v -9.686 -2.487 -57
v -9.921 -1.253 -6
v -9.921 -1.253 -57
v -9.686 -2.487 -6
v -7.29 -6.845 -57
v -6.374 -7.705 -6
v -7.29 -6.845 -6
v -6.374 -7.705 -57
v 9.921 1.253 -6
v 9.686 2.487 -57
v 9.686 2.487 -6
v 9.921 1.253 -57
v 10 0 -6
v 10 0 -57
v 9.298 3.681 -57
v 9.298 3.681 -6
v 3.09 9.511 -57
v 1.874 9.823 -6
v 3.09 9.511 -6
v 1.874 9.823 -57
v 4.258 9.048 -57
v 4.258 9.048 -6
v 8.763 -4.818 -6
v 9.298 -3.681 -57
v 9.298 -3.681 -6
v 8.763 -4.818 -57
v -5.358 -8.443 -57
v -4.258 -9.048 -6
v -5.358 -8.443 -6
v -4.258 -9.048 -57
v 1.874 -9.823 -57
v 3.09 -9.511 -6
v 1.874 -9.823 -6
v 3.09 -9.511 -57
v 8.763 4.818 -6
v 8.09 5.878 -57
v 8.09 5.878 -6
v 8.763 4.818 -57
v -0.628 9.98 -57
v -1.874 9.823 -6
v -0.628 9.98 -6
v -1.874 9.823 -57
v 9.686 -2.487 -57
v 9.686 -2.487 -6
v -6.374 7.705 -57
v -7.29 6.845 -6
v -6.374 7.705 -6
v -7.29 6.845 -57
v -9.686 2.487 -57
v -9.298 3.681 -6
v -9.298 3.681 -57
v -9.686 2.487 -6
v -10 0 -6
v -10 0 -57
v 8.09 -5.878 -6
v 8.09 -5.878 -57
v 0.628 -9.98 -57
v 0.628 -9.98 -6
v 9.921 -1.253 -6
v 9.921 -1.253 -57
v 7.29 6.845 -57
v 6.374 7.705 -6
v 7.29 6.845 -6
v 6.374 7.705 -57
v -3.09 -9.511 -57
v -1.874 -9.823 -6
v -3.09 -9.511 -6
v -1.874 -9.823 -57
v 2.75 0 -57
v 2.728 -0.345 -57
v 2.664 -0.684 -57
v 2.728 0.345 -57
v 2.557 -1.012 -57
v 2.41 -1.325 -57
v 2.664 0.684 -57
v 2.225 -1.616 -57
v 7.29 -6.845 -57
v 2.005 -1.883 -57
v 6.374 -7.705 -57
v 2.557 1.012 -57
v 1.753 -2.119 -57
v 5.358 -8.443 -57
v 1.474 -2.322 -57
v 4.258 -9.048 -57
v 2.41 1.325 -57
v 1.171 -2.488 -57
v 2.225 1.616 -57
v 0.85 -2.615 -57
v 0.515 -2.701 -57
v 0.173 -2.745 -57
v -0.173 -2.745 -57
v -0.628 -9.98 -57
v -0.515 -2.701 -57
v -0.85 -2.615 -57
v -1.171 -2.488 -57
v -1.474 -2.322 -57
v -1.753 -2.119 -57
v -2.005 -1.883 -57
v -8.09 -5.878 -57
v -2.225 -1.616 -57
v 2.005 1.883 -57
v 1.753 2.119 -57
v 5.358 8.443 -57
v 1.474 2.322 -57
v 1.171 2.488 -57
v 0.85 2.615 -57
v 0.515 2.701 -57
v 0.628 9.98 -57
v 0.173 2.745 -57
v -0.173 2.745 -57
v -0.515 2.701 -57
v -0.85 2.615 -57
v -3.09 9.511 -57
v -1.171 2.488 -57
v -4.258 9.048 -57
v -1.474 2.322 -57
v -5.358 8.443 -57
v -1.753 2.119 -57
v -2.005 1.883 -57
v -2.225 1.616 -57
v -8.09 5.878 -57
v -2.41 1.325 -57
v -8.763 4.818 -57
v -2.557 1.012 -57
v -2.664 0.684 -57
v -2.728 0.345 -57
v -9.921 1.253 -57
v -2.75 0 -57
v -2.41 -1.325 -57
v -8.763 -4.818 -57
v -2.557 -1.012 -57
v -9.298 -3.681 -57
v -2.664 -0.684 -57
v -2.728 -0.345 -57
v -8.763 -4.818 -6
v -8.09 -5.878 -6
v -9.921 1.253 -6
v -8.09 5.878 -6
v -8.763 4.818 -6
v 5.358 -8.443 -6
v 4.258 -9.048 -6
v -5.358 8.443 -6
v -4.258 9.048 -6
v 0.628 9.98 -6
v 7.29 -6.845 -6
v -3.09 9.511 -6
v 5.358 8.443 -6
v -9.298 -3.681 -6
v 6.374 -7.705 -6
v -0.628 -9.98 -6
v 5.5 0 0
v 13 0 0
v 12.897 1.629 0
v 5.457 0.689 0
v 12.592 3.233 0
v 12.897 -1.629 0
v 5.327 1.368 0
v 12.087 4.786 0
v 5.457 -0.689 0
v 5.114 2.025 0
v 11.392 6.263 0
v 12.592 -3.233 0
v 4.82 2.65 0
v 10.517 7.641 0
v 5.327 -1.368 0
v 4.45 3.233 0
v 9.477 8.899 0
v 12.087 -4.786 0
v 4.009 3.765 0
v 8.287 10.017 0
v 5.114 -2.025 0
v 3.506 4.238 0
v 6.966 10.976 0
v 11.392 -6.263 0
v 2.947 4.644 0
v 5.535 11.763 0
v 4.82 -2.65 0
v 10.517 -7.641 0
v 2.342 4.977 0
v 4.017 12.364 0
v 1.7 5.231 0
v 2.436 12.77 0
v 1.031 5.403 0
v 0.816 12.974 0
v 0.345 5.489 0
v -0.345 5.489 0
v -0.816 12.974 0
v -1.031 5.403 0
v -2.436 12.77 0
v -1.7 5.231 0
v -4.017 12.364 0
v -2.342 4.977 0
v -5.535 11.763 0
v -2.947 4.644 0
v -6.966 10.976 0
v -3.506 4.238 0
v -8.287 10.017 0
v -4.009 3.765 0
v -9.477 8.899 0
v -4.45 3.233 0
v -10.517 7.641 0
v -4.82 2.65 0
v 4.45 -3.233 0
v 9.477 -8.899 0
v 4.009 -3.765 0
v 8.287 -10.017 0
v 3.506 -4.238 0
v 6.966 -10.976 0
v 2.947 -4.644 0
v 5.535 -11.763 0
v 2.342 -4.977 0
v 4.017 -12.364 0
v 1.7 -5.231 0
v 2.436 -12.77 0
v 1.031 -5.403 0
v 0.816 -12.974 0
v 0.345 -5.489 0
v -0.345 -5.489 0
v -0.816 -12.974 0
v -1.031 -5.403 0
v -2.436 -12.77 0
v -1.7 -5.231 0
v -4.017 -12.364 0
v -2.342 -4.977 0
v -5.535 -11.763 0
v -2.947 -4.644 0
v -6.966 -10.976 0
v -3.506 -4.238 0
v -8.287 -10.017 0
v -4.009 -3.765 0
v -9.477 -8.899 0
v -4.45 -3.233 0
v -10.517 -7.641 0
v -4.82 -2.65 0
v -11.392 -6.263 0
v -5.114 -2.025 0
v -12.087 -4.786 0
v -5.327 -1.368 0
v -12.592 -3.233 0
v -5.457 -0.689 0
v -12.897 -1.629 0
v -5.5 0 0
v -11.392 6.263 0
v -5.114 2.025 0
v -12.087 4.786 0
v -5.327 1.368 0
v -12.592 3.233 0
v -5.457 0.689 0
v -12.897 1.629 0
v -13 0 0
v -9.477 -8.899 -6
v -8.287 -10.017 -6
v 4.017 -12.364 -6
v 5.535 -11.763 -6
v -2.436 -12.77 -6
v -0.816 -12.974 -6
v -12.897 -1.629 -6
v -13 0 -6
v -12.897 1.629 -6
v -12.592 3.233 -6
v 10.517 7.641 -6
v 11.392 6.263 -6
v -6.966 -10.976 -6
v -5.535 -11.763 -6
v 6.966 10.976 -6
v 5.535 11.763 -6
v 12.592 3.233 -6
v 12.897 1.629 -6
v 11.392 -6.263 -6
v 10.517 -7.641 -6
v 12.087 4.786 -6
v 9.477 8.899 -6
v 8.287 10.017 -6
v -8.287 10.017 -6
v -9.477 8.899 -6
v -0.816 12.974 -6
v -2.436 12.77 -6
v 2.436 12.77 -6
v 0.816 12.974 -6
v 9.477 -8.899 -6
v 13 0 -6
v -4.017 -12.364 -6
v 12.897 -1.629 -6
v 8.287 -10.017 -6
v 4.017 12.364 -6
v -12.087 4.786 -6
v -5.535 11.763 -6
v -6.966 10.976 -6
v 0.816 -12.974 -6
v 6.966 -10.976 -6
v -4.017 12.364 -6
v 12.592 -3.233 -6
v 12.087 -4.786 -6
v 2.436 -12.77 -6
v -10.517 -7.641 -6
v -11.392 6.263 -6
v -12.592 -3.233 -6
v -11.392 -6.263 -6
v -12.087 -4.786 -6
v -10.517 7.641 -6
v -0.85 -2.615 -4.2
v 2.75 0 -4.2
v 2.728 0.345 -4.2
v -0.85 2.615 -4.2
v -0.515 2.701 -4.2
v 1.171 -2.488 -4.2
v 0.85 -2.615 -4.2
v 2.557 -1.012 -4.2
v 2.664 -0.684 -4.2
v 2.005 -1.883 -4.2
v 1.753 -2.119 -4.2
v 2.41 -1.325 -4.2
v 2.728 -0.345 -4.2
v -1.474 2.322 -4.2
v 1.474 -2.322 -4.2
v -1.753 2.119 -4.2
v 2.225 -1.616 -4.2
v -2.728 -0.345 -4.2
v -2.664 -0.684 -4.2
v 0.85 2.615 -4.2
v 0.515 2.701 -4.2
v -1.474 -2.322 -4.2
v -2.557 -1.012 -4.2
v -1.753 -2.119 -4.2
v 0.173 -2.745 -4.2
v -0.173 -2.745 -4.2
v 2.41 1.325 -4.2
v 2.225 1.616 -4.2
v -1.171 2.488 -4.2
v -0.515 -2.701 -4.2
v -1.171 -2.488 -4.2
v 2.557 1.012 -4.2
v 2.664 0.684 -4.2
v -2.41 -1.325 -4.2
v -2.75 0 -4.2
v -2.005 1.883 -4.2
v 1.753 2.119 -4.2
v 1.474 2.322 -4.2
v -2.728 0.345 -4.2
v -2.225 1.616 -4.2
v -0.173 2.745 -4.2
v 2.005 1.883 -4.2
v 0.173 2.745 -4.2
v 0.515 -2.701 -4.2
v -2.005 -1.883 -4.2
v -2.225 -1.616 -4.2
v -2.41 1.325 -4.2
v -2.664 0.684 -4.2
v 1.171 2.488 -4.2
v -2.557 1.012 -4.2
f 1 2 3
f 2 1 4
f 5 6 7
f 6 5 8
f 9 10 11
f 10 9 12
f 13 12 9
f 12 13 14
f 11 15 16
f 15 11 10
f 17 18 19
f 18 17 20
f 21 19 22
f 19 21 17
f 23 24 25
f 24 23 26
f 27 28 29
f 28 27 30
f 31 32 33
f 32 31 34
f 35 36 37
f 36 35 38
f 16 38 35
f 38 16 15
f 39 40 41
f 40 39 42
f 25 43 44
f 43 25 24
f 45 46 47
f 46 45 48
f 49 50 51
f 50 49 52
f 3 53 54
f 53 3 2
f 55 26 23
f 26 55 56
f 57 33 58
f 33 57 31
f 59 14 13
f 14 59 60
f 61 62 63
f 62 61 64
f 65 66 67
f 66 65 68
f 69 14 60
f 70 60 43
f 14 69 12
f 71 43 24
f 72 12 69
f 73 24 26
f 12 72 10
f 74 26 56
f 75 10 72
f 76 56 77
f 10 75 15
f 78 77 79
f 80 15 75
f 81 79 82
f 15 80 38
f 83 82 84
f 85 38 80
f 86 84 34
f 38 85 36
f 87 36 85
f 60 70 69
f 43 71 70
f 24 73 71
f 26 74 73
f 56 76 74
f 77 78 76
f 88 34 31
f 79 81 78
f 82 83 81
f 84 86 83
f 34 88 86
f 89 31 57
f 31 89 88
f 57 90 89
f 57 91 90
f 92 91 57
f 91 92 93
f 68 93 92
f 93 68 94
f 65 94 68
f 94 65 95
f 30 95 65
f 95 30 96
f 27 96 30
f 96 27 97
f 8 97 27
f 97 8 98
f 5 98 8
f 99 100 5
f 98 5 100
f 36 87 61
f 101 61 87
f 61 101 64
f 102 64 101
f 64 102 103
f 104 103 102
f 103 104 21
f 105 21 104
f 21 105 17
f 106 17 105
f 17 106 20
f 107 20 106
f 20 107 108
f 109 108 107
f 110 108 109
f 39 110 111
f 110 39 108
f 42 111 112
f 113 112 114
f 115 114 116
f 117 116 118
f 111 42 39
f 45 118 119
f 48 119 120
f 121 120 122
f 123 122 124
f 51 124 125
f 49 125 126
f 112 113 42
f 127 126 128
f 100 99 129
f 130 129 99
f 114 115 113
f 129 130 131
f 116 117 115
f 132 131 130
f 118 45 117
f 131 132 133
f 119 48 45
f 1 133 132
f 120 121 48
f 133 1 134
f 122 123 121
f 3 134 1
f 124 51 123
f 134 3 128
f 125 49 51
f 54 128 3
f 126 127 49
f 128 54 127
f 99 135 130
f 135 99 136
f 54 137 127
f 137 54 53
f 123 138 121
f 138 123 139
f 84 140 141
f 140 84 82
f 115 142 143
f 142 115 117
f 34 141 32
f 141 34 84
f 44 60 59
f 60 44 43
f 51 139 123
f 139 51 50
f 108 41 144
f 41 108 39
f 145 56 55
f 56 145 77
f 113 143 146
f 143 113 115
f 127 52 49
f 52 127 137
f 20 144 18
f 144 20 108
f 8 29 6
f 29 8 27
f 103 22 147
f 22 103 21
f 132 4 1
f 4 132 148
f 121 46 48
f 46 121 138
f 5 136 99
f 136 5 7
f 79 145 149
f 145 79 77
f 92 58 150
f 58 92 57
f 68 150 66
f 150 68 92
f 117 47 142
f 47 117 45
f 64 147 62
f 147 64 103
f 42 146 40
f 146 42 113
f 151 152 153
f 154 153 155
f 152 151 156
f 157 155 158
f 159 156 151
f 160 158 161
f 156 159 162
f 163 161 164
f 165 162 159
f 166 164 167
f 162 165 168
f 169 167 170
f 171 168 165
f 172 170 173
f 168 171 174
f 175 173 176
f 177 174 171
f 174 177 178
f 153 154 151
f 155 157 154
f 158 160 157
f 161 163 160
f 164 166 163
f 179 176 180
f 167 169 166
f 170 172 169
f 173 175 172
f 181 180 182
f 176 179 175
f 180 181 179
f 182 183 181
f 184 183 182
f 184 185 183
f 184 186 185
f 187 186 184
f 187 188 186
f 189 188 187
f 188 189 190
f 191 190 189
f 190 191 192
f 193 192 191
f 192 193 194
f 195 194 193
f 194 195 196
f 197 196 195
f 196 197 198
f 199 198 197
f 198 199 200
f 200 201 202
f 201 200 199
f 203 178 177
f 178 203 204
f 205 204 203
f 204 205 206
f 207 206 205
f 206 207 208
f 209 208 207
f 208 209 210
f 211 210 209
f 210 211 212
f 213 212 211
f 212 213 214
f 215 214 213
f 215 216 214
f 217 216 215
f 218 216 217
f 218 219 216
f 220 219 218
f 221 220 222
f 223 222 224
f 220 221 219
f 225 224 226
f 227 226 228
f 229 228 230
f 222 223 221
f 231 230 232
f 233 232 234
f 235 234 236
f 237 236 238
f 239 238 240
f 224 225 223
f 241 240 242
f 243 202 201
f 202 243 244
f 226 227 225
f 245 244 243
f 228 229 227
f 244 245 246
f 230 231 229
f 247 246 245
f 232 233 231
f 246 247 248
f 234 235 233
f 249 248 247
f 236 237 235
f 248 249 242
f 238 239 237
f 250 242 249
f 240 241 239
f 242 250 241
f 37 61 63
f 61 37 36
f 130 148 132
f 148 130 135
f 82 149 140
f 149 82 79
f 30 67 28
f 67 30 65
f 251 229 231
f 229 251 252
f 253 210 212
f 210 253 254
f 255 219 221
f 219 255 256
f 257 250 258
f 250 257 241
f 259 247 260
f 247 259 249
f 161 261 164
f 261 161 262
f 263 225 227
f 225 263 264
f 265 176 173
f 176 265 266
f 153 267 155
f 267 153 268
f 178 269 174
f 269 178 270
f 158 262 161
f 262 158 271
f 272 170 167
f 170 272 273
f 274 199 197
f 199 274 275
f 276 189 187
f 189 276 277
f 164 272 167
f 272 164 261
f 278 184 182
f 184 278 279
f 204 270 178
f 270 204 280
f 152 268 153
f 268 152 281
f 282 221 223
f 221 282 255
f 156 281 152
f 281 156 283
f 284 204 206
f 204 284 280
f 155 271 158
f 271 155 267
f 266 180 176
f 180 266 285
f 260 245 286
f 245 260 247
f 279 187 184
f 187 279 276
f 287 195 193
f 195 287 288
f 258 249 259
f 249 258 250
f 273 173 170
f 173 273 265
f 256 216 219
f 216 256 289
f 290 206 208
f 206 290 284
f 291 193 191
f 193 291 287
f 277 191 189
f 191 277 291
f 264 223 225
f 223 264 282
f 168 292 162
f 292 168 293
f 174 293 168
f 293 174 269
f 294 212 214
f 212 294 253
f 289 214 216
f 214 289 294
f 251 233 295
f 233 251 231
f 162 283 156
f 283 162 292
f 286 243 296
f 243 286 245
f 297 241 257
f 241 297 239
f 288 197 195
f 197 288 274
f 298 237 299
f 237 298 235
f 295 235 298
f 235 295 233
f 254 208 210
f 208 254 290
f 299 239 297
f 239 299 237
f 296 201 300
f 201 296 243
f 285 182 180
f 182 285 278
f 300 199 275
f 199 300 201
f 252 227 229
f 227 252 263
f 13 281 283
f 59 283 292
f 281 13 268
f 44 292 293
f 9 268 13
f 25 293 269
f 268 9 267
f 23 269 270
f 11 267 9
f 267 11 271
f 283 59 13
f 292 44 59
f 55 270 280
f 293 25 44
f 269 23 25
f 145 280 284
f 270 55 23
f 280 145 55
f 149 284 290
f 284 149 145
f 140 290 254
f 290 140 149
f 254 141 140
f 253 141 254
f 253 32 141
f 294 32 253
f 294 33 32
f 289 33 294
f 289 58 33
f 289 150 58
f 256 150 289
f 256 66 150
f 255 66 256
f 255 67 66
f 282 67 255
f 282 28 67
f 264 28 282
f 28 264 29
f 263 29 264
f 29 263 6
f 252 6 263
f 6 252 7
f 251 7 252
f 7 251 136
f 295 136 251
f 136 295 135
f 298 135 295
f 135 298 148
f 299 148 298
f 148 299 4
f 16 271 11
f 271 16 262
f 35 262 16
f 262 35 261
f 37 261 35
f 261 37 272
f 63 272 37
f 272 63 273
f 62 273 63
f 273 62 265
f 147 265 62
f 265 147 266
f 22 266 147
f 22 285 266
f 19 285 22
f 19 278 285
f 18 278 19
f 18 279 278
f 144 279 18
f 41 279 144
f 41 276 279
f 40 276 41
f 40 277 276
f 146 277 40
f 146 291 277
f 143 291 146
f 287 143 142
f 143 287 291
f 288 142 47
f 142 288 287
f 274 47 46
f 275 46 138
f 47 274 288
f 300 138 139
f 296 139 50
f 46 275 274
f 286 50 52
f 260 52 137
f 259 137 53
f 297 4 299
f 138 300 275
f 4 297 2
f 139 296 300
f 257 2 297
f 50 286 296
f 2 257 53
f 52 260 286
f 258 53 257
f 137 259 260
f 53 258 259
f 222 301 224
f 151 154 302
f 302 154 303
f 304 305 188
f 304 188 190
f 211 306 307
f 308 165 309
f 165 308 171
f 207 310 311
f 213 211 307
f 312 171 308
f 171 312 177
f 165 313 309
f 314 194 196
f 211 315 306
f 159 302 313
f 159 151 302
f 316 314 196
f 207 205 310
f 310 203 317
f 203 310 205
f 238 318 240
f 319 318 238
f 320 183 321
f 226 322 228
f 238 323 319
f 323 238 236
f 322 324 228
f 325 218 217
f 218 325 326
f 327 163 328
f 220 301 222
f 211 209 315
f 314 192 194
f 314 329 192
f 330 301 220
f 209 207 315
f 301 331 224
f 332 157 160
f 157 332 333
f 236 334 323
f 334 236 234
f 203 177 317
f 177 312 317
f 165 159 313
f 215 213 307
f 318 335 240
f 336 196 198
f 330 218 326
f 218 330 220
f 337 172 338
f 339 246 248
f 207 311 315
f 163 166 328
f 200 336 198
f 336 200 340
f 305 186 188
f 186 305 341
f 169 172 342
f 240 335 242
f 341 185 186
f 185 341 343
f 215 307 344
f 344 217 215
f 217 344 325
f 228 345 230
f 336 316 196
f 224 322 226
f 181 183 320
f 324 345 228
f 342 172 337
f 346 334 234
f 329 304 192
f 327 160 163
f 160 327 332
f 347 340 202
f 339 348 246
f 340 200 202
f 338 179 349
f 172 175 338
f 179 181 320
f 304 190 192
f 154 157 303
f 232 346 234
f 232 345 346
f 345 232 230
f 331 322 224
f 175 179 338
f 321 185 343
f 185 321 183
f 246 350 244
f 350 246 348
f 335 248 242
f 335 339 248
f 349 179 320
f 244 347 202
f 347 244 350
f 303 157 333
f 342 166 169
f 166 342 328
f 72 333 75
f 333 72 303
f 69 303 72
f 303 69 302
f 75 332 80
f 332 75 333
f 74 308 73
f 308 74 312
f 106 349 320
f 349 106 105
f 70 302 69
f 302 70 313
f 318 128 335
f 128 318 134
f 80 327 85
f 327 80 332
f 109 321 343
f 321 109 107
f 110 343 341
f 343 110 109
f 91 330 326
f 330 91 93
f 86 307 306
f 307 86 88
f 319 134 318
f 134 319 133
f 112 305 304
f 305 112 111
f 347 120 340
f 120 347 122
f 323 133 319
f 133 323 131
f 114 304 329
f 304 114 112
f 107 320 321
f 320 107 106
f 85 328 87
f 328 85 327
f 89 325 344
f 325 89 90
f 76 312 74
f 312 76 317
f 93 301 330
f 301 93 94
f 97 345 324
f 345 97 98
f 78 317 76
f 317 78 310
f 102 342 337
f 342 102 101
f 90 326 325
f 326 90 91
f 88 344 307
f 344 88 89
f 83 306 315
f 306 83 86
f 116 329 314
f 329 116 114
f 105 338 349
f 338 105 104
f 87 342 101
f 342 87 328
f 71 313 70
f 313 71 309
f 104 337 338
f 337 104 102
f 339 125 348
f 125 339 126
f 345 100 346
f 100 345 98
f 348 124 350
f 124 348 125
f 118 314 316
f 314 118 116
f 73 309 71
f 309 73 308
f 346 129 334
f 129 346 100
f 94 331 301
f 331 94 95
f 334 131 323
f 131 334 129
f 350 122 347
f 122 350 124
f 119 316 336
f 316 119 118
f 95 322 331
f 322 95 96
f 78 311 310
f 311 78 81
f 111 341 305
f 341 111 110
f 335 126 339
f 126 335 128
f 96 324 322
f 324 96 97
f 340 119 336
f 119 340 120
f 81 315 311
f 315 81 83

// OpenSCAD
$fn = 50;


difference() {
	union() {
		translate(v = [0, 0, -57.0000000000]) {
			cylinder(h = 57, r = 10.0000000000);
		}
		translate(v = [0, 0, -6.0000000000]) {
			cylinder(h = 6, r = 13.0000000000);
		}
	}
	union() {
		translate(v = [0, 0, 0]) {
			rotate(a = [0, 0, 0]) {
				difference() {
					union() {
						#translate(v = [0, 0, -57.0000000000]) {
							cylinder(h = 57, r = 2.2500000000);
						}
						#translate(v = [0, 0, -4.2000000000]) {
							cylinder(h = 4.2000000000, r1 = 2.7500000000, r2 = 5.5000000000);
						}
						#translate(v = [0, 0, -57.0000000000]) {
							cylinder(h = 57, r = 2.7500000000);
						}
						#translate(v = [0, 0, -57.0000000000]) {
							cylinder(h = 57, r = 2.2500000000);
						}
					}
					union();
				}
			}
		}
	}
}
